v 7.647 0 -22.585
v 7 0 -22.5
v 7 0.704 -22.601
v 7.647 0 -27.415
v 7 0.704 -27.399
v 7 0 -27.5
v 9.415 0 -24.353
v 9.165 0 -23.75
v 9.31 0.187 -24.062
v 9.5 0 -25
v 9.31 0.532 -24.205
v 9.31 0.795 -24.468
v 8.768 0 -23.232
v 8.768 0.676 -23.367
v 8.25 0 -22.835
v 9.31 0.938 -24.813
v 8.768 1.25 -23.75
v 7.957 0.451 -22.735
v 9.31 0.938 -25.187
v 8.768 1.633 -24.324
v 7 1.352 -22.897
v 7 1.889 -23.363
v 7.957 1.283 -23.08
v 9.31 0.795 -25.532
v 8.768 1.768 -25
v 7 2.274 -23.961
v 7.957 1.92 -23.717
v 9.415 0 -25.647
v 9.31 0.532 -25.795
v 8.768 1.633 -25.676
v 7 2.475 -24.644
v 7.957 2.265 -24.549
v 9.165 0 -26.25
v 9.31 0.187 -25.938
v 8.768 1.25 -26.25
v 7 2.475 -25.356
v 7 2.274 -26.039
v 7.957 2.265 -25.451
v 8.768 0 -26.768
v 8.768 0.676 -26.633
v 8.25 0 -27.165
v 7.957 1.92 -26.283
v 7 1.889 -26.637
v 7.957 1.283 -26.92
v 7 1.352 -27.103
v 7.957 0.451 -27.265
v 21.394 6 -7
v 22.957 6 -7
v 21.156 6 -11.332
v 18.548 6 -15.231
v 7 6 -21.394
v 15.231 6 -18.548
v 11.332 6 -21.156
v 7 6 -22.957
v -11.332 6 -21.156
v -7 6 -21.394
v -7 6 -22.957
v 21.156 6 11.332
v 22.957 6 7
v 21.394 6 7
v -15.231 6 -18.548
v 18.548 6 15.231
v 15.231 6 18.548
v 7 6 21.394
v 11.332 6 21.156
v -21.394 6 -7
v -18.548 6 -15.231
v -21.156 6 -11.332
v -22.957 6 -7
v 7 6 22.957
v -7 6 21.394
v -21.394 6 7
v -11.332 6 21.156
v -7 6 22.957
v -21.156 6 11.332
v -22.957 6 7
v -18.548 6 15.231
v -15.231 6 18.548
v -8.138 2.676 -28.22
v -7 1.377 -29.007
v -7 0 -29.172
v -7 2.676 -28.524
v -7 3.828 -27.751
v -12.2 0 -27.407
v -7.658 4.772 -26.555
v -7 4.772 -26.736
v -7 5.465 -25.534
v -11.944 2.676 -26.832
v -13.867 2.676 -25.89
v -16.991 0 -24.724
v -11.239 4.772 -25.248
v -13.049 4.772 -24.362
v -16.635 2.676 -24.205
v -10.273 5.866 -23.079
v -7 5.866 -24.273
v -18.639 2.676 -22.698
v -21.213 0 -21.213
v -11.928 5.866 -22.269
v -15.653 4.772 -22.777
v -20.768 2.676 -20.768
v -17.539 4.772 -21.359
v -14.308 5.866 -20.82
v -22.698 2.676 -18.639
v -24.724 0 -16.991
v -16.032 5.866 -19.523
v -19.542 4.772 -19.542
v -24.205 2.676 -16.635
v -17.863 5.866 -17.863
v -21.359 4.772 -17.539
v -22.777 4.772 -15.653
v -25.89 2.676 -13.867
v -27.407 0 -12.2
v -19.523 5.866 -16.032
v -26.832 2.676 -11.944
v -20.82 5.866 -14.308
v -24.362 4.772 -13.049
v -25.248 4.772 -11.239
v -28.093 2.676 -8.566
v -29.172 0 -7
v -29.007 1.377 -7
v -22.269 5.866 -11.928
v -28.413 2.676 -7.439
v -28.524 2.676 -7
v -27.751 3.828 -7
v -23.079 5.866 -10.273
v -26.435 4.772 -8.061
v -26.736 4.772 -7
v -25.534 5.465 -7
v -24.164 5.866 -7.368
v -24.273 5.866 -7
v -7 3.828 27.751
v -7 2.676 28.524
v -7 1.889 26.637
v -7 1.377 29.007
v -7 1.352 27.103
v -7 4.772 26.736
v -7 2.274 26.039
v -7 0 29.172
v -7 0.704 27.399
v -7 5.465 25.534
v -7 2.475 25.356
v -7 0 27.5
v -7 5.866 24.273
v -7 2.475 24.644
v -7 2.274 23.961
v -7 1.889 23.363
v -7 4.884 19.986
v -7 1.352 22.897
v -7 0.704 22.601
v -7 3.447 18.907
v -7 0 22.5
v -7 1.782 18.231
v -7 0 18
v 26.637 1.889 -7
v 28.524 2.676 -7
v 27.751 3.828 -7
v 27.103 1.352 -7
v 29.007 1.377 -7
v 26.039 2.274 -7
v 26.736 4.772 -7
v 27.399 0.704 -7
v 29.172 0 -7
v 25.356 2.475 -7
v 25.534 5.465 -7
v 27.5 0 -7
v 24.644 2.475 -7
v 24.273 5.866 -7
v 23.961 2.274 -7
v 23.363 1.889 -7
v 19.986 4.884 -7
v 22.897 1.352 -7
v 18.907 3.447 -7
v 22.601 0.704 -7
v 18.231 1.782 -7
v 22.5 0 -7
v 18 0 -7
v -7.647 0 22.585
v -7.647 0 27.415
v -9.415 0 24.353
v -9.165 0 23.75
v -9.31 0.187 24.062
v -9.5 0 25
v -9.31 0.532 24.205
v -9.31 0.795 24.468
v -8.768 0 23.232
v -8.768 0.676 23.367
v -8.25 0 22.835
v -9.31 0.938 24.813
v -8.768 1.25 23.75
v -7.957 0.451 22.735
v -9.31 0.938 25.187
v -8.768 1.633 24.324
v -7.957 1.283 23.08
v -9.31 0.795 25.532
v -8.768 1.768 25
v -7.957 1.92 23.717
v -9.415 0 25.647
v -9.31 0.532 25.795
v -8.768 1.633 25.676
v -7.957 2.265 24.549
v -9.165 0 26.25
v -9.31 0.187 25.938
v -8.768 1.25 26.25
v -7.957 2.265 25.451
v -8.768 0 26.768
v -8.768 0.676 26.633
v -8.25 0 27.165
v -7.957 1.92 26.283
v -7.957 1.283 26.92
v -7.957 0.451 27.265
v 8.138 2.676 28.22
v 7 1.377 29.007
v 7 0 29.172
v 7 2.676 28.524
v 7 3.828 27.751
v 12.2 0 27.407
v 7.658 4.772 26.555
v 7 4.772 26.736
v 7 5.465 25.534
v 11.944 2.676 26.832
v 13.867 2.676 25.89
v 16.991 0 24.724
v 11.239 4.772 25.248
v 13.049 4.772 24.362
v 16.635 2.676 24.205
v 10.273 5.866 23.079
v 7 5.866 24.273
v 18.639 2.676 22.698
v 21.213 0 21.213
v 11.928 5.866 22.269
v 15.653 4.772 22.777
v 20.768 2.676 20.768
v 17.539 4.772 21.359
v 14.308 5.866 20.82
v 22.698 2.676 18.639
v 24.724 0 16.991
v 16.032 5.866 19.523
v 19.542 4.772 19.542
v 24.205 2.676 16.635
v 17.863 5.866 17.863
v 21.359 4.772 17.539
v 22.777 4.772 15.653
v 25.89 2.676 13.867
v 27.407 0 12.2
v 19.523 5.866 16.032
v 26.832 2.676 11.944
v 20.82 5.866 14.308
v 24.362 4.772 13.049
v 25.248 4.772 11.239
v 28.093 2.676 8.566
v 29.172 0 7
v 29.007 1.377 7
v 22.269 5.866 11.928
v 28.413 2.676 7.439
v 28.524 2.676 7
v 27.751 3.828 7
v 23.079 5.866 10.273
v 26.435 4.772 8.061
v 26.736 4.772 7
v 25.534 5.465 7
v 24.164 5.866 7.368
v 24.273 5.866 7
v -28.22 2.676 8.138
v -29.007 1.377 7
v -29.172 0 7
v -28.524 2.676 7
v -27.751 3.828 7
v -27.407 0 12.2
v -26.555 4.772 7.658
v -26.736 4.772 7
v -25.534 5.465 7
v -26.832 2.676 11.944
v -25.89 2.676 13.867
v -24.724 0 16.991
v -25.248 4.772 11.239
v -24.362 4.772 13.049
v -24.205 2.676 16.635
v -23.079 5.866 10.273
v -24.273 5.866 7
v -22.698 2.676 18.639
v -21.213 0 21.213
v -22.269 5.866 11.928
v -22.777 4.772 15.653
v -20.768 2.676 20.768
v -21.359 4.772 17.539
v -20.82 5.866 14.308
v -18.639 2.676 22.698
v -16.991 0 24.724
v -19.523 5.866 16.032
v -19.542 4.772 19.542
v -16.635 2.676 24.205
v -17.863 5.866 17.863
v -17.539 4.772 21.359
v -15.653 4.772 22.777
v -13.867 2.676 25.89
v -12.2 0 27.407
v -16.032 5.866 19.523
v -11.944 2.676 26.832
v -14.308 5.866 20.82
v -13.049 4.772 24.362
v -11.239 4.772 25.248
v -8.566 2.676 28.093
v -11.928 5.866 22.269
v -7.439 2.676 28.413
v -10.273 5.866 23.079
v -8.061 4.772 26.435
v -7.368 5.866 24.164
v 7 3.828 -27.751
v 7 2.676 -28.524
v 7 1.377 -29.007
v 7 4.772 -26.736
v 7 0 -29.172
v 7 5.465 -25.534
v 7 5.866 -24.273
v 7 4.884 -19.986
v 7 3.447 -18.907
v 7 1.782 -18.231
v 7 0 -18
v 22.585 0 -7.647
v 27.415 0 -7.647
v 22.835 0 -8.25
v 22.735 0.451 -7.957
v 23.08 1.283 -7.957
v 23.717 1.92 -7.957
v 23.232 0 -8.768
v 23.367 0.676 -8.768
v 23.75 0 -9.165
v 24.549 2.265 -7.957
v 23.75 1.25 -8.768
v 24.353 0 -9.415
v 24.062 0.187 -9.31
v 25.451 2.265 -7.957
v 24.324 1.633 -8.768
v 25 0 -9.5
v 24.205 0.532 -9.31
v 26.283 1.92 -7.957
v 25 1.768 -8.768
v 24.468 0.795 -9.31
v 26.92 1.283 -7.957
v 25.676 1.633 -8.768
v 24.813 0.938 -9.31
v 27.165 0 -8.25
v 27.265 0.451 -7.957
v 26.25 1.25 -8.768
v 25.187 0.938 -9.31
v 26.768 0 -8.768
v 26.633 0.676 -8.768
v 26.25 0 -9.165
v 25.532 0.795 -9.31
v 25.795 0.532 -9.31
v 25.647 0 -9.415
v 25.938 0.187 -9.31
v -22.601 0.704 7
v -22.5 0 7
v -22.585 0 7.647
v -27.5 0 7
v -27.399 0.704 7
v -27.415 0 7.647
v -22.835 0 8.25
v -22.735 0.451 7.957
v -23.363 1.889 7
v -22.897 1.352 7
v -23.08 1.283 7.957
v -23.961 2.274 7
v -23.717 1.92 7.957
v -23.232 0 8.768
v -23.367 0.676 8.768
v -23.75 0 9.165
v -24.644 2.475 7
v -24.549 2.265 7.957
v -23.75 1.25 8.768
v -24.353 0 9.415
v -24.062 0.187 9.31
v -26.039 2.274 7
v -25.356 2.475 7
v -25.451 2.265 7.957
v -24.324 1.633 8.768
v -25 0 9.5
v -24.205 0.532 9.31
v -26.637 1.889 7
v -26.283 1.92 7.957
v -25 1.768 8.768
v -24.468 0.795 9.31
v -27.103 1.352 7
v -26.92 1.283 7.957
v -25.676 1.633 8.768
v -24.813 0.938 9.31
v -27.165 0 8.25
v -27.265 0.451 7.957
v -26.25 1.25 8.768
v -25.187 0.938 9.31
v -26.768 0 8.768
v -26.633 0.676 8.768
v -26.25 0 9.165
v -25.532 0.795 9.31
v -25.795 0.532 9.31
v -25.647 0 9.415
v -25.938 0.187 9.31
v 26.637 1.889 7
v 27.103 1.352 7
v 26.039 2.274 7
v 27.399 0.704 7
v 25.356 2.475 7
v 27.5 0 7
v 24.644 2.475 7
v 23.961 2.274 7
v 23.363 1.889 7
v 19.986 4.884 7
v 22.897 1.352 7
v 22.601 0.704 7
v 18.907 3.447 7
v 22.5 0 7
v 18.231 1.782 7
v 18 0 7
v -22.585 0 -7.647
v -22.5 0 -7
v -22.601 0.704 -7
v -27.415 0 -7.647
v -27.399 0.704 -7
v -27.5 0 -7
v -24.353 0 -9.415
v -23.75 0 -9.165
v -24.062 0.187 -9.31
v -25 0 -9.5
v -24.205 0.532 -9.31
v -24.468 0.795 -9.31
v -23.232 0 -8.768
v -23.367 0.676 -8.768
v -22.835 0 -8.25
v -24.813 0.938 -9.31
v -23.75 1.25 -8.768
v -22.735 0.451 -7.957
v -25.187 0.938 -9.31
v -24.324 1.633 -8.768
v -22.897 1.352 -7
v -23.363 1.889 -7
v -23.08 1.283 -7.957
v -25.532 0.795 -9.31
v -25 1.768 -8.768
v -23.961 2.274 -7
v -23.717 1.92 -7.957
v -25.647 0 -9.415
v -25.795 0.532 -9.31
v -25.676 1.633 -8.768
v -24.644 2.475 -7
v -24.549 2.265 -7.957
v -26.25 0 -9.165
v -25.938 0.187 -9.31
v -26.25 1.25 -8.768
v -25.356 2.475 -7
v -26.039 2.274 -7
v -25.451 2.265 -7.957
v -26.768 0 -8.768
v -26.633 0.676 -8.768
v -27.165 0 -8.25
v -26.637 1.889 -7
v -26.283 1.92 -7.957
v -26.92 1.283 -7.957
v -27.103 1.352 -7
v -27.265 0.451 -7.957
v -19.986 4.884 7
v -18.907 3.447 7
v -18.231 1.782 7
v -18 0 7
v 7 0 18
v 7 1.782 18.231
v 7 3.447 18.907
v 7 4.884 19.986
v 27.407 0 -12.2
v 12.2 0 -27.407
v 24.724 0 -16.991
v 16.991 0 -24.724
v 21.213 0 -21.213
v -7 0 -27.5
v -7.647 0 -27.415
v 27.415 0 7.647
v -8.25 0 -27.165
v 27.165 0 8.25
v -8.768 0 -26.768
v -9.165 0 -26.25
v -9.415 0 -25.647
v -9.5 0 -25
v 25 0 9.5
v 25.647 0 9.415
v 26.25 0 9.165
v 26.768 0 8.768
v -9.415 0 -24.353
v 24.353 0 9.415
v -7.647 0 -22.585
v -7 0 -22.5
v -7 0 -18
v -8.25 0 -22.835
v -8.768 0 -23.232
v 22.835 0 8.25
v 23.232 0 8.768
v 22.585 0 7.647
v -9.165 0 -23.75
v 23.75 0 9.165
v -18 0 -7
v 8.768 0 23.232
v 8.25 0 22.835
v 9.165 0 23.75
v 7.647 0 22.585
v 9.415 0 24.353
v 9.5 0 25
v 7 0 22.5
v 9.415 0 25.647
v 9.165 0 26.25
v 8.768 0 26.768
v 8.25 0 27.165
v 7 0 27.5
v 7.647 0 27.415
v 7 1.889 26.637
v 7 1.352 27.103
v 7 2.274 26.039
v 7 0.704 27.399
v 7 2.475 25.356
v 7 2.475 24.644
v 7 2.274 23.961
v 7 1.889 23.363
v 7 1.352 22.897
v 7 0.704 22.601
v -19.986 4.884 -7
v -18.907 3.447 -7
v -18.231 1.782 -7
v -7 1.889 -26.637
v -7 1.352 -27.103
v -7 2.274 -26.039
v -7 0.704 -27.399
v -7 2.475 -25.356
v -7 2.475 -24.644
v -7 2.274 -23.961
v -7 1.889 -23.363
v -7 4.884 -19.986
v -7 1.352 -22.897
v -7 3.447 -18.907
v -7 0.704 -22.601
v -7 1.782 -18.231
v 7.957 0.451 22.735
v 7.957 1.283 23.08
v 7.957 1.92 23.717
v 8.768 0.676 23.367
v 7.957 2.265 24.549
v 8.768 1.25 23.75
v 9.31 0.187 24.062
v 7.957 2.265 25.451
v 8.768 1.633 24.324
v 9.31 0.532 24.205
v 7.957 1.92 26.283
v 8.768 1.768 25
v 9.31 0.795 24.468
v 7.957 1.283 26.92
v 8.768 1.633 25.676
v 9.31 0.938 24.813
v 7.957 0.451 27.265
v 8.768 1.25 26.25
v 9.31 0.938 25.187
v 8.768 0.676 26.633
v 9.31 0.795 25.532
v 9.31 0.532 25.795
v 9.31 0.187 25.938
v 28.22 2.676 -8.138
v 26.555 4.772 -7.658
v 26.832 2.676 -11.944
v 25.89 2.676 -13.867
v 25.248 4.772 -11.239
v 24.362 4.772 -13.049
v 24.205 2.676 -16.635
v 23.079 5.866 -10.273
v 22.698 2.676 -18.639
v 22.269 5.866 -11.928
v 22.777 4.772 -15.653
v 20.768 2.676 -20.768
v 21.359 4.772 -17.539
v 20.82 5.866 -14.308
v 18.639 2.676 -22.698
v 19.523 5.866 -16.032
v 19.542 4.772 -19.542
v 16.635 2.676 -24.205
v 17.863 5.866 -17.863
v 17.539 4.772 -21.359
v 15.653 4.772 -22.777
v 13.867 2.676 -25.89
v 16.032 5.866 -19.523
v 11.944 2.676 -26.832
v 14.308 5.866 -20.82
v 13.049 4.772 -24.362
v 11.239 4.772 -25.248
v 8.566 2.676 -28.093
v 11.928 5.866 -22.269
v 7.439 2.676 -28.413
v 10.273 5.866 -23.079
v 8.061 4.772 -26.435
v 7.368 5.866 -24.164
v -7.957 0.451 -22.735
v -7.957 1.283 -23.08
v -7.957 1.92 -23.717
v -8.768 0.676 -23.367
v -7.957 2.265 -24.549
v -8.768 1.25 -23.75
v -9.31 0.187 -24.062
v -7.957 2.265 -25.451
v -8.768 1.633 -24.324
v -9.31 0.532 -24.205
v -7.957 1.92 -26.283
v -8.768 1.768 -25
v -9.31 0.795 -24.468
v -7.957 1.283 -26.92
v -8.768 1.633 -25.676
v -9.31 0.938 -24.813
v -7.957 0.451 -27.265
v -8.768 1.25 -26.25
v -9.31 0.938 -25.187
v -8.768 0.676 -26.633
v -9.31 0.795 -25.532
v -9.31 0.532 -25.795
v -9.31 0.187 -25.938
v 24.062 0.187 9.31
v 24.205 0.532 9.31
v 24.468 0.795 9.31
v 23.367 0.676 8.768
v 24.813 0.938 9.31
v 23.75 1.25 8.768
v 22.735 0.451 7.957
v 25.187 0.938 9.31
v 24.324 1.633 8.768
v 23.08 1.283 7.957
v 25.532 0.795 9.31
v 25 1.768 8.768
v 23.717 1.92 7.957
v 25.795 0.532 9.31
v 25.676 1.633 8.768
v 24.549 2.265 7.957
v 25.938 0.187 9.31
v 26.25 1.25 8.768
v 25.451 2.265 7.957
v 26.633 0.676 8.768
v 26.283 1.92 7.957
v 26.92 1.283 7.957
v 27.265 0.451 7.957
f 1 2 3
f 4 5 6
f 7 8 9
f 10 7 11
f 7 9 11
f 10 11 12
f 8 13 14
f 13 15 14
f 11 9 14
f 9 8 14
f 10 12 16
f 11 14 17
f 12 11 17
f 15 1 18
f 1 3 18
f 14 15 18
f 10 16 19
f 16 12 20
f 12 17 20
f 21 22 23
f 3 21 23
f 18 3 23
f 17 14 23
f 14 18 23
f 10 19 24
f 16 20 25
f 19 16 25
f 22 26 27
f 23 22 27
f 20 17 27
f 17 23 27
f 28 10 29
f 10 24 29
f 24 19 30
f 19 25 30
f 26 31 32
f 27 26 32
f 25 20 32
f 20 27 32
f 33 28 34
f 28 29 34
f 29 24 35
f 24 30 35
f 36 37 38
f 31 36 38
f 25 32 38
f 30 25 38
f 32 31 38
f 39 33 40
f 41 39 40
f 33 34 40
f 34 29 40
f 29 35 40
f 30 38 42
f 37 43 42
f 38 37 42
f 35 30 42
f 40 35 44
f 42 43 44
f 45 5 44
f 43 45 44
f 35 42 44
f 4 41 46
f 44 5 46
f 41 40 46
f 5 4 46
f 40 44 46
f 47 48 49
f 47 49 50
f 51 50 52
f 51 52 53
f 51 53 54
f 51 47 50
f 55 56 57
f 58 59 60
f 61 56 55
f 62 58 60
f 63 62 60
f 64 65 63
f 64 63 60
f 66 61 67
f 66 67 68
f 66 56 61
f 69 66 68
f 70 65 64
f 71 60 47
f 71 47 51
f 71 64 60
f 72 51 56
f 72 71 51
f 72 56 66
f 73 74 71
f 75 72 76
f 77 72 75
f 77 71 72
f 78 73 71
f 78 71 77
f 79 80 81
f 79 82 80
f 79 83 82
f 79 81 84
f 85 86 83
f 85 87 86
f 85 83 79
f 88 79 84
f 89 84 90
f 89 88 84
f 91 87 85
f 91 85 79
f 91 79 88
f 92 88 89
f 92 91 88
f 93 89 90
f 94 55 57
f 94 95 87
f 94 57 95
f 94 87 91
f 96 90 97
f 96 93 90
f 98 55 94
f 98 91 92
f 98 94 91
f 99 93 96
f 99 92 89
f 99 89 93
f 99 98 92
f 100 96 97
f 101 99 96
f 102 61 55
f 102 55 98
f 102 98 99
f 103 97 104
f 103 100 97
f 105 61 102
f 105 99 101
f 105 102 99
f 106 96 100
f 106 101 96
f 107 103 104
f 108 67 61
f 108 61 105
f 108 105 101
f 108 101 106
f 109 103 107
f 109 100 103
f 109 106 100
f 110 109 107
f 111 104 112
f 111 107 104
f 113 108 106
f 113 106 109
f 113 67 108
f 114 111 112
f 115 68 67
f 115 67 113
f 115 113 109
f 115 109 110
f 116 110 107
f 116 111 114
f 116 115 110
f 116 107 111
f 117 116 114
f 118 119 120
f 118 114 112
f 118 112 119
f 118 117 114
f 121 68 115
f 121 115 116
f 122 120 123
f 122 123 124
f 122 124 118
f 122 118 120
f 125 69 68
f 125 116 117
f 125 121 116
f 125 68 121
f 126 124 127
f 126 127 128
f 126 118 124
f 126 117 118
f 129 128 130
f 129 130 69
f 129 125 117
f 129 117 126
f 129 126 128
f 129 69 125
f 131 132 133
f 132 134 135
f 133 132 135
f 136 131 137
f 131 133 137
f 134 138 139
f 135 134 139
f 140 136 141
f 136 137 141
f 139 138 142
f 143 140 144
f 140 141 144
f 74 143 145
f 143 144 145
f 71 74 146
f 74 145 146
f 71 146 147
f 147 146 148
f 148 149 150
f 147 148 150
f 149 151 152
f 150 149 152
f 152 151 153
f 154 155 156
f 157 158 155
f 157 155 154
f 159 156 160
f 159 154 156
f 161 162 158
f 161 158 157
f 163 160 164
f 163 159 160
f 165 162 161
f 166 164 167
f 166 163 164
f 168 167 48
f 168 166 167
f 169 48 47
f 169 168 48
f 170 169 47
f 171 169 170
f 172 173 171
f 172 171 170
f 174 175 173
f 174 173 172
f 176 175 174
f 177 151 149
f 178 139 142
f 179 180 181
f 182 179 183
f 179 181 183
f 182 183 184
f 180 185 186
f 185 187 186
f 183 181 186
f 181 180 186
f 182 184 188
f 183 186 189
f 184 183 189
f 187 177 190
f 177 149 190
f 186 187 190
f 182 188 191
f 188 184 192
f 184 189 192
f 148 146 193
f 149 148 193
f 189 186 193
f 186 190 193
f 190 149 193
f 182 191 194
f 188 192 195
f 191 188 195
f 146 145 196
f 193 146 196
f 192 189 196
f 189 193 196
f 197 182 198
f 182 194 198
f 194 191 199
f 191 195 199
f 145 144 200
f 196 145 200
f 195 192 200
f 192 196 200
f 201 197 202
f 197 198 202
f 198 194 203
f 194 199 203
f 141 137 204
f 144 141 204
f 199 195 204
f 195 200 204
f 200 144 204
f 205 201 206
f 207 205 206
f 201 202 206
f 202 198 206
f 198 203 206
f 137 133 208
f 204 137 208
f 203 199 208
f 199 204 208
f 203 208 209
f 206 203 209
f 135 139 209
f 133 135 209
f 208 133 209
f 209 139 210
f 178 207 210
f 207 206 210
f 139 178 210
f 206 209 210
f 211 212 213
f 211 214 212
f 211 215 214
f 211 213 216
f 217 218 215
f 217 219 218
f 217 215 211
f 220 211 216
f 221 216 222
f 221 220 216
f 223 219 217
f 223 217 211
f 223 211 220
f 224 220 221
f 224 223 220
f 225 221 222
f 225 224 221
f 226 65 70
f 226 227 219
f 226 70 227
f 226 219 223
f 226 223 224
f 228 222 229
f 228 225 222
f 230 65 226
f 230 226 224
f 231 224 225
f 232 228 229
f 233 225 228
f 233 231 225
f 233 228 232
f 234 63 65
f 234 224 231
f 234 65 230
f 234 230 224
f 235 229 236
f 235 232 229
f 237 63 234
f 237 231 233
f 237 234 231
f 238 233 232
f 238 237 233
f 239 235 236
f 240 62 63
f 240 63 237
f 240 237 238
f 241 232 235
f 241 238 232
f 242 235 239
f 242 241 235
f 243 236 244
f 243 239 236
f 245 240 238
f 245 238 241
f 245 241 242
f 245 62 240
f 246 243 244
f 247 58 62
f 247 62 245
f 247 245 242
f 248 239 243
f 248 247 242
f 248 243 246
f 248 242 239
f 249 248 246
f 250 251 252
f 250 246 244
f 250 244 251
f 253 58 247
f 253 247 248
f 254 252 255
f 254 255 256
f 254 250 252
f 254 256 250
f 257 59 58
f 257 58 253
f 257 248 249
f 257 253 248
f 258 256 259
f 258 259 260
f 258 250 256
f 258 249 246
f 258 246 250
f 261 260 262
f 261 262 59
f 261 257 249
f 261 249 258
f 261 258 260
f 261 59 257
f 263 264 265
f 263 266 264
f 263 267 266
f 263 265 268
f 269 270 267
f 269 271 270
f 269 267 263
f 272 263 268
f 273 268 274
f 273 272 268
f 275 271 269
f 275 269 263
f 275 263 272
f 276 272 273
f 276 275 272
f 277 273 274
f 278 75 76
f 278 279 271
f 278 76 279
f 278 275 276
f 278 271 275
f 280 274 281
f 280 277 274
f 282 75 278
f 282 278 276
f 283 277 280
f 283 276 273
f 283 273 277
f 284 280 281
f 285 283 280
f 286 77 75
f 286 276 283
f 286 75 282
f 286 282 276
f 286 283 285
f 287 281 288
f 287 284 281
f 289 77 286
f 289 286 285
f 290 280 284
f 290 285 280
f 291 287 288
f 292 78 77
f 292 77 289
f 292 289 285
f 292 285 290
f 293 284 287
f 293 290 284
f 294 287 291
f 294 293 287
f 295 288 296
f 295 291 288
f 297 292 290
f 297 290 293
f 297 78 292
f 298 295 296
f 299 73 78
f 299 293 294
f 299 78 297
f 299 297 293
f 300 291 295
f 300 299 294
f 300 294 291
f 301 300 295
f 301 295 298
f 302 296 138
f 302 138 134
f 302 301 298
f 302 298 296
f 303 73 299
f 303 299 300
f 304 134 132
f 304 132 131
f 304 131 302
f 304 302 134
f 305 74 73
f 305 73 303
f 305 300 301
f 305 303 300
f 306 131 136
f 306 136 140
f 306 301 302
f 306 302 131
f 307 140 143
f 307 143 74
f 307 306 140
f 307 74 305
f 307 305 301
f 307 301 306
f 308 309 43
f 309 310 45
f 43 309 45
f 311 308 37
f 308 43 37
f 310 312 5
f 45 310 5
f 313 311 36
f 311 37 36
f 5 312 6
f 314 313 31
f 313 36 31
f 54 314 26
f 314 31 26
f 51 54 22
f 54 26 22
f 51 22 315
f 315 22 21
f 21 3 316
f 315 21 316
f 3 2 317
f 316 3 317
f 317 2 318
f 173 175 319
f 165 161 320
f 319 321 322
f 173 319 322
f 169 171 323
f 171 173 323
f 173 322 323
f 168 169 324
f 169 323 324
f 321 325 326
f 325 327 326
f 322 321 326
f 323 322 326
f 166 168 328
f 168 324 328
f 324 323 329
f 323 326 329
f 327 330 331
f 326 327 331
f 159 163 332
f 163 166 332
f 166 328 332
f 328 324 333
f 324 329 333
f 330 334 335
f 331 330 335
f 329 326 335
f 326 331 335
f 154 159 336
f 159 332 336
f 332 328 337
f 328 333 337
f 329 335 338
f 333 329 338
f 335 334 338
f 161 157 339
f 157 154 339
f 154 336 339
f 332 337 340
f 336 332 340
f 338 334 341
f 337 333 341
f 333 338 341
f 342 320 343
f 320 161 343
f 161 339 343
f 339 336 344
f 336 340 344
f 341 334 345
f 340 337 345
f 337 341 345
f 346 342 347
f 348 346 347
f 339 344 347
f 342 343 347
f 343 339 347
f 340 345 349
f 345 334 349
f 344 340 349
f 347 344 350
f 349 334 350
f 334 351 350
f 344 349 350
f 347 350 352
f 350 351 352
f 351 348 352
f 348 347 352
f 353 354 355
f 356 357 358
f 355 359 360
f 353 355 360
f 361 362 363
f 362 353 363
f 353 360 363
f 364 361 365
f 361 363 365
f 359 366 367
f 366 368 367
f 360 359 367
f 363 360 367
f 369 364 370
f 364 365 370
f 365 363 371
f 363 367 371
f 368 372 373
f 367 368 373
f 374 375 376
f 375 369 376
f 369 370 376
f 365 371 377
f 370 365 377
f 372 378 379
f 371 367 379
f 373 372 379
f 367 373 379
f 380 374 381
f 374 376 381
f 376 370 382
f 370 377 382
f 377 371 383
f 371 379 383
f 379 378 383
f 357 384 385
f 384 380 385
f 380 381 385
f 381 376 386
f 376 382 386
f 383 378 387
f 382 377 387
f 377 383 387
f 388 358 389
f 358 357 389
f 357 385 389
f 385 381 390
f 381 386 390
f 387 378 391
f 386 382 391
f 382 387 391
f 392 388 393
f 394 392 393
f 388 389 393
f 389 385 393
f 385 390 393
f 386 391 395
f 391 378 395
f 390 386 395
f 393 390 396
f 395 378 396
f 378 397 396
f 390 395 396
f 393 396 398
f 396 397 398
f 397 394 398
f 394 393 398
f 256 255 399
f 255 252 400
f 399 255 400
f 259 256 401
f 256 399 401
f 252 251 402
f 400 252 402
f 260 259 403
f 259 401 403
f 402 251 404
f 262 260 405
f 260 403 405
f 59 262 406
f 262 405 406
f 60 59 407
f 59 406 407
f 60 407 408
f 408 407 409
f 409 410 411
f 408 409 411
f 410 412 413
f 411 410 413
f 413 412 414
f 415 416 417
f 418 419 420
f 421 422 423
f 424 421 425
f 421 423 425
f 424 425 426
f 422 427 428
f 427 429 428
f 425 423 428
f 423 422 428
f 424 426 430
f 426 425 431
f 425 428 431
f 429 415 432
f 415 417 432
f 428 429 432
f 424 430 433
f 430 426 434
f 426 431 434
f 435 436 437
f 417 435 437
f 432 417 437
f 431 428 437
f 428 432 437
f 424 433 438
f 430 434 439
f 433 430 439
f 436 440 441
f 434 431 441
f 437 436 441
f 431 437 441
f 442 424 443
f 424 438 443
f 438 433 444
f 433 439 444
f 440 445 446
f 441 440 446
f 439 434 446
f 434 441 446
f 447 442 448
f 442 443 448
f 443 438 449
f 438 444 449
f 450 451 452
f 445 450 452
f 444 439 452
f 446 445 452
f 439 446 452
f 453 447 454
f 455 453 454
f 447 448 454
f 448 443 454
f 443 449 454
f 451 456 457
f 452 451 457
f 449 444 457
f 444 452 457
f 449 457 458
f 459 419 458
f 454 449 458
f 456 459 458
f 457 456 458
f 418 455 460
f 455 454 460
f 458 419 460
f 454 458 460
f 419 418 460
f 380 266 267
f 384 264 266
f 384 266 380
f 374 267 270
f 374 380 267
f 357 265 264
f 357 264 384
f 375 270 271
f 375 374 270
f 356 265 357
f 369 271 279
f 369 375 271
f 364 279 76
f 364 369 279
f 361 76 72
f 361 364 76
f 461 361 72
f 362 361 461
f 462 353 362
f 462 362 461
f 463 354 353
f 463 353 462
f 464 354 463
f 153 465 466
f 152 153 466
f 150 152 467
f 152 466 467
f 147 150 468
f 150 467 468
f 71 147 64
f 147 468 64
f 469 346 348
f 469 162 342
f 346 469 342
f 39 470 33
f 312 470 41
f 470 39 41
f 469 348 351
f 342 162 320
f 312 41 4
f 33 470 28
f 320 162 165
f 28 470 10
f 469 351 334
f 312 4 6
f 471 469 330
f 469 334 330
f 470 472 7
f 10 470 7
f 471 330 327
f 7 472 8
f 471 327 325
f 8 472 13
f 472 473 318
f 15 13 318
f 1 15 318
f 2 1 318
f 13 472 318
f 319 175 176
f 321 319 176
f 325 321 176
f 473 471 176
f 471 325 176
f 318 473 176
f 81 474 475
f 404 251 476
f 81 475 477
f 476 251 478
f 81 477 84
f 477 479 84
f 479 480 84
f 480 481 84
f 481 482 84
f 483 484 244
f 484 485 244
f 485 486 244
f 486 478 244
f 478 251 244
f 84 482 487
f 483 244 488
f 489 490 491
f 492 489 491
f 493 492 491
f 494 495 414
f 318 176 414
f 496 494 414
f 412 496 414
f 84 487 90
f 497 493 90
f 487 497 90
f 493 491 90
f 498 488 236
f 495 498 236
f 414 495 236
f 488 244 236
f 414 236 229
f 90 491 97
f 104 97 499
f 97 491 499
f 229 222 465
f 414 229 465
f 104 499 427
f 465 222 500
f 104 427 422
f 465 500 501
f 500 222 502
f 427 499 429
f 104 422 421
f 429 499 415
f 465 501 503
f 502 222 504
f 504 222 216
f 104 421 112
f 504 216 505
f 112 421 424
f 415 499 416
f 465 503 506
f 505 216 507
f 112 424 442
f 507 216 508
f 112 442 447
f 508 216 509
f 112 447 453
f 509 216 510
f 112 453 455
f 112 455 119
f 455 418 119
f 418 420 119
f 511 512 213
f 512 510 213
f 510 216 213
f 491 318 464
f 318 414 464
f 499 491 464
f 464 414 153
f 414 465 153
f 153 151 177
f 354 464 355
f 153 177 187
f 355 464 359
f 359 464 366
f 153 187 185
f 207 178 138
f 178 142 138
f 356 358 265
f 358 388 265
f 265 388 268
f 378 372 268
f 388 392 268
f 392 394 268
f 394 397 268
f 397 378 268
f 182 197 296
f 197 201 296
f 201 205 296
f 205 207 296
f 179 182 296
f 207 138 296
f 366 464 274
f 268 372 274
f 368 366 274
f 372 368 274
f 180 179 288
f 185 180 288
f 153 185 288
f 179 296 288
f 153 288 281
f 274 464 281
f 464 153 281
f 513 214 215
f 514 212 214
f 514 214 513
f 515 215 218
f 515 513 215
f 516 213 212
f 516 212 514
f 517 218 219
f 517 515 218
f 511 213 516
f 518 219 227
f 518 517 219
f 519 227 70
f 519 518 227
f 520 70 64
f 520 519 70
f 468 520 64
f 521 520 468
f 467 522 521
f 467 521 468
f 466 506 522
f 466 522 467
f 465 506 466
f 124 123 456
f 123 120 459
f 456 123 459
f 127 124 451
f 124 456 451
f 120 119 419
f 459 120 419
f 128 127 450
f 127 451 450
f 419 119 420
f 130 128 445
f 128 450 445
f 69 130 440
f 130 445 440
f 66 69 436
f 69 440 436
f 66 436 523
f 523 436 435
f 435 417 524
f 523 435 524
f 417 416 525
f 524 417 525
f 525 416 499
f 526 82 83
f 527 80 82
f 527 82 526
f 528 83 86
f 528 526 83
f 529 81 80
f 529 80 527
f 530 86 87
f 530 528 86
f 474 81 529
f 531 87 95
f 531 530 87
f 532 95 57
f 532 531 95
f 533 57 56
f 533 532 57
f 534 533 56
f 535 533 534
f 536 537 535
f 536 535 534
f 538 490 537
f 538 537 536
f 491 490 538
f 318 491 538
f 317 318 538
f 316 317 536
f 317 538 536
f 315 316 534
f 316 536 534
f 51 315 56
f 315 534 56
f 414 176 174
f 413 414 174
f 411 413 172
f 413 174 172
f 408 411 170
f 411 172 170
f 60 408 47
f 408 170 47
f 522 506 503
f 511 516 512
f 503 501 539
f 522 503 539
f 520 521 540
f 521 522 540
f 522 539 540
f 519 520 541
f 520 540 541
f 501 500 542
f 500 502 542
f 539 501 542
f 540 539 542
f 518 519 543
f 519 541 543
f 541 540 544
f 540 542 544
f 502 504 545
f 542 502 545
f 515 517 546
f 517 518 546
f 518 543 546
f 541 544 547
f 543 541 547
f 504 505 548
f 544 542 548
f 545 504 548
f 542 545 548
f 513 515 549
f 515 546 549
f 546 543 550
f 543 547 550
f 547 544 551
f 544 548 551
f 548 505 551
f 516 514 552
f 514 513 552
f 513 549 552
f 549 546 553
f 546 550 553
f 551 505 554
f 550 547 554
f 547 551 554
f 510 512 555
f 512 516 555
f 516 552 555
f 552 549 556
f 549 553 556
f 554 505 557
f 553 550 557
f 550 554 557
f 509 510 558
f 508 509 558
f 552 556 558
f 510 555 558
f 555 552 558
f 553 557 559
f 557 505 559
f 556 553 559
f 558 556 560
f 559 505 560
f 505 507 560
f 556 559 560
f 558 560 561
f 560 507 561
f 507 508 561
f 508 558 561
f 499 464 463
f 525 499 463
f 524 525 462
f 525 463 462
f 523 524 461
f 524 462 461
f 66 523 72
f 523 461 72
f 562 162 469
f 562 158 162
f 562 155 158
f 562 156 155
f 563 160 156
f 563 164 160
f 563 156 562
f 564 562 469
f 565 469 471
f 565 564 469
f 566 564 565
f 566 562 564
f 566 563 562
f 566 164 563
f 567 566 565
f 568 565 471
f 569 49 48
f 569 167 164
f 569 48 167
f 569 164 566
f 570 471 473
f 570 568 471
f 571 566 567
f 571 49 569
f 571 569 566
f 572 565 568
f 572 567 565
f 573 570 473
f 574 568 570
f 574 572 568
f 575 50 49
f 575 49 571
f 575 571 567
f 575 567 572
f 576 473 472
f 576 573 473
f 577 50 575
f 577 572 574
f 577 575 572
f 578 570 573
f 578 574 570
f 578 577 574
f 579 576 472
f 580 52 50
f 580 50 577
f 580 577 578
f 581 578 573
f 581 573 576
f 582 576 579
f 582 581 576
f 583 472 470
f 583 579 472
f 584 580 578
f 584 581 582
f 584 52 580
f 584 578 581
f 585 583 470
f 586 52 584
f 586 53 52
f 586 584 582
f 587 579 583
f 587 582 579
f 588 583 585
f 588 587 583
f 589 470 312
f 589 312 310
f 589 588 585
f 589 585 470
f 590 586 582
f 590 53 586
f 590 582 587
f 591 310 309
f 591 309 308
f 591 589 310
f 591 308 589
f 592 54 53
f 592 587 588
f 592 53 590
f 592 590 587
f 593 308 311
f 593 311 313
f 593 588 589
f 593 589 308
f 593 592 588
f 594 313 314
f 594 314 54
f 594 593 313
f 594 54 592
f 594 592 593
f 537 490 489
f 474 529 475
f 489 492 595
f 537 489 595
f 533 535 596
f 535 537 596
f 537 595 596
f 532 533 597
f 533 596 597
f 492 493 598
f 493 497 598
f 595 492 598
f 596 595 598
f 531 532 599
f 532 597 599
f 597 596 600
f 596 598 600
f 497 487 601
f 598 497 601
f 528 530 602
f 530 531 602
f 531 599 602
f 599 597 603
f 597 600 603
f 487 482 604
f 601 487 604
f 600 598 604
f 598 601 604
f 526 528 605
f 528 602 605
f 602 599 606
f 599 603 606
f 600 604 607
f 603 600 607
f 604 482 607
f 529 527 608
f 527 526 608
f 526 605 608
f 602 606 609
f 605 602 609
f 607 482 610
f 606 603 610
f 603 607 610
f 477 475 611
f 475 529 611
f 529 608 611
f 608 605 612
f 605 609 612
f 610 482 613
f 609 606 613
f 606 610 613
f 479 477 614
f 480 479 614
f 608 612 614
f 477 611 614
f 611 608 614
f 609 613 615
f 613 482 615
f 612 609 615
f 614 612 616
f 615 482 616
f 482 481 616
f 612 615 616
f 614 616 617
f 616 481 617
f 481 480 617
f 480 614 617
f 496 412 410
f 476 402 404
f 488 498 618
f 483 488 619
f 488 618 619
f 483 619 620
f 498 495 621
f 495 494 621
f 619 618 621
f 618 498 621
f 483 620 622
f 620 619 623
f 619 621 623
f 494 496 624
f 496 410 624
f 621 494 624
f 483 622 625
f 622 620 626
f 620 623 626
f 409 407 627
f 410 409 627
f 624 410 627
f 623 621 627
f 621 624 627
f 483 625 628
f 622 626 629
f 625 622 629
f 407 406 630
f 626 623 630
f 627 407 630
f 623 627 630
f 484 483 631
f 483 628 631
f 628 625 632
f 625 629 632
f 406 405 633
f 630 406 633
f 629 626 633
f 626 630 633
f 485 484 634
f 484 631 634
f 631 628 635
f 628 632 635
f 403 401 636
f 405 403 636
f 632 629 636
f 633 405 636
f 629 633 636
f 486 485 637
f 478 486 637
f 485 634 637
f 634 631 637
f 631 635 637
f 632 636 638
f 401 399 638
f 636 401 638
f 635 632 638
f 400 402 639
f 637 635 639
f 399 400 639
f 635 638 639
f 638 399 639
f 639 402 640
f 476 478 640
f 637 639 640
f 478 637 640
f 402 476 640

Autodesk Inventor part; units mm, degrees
ref_plane "YZ Plane" through (0, 0, 0) normal (1, 0, 0) x (0, 1, 0)
ref_plane "XZ Plane" through (0, 0, 0) normal (0, 1, 0) x (-1, 0, 0)
ref_plane "XY Plane" through (0, 0, 0) normal (0, 0, 1) x (1, 0, 0)
sketch "Sketch1" plane through (0, 0, 0) normal (0, 1, 0) x (-1, 0, 0)
  circle A0 centre (0, 0) radius 30
  dimension "d0" = 60
extrude "Extrusion1" add sketch "Sketch1" along normal blind 6
fillet "Fillet1" radius 6 1 edges at (30, 6, 0)
sketch "Sketch2" plane through (0, 0, 0) normal (0, -1, 0) x (1, 0, 0)
  line L0 (-7, -25) -> (7, -25)
  line L1 (7, -25) -> (7, -18)
  line L2 (7, -18) -> (-7, -18)
  line L3 (-7, -18) -> (-7, -25)
  line L4 (-7, -25) -> (7, -18) construction
  line L5 (7, -25) -> (-7, -18) construction
  arc A0 (-4.5, -25) -> (-9.5, -25) centre (-7, -25) ccw
  arc A1 (9.5, -25) -> (4.5, -25) centre (7, -25) ccw
  line L6 (-9.5, -25) -> (9.5, -25)
  point P0 (0, 0)
  point P1 (0, -21.5)
  dimension "d4" = 14
  dimension "d5" = 7
  dimension "d6" = 18
  dimension "d7" = 5
  dimension "d8" = 5
revolve "Revolution1" cut sketch "Sketch2" angle 360 about axis through (-7, 0, -25) along (1, 0, 0)
pattern_circular "Circular Pattern1" count 4 over 360 about axis through (0, -10, 0) along (0, 1, 0) of "Revolution1"
properties part number "omni_wheel_cover_template"
